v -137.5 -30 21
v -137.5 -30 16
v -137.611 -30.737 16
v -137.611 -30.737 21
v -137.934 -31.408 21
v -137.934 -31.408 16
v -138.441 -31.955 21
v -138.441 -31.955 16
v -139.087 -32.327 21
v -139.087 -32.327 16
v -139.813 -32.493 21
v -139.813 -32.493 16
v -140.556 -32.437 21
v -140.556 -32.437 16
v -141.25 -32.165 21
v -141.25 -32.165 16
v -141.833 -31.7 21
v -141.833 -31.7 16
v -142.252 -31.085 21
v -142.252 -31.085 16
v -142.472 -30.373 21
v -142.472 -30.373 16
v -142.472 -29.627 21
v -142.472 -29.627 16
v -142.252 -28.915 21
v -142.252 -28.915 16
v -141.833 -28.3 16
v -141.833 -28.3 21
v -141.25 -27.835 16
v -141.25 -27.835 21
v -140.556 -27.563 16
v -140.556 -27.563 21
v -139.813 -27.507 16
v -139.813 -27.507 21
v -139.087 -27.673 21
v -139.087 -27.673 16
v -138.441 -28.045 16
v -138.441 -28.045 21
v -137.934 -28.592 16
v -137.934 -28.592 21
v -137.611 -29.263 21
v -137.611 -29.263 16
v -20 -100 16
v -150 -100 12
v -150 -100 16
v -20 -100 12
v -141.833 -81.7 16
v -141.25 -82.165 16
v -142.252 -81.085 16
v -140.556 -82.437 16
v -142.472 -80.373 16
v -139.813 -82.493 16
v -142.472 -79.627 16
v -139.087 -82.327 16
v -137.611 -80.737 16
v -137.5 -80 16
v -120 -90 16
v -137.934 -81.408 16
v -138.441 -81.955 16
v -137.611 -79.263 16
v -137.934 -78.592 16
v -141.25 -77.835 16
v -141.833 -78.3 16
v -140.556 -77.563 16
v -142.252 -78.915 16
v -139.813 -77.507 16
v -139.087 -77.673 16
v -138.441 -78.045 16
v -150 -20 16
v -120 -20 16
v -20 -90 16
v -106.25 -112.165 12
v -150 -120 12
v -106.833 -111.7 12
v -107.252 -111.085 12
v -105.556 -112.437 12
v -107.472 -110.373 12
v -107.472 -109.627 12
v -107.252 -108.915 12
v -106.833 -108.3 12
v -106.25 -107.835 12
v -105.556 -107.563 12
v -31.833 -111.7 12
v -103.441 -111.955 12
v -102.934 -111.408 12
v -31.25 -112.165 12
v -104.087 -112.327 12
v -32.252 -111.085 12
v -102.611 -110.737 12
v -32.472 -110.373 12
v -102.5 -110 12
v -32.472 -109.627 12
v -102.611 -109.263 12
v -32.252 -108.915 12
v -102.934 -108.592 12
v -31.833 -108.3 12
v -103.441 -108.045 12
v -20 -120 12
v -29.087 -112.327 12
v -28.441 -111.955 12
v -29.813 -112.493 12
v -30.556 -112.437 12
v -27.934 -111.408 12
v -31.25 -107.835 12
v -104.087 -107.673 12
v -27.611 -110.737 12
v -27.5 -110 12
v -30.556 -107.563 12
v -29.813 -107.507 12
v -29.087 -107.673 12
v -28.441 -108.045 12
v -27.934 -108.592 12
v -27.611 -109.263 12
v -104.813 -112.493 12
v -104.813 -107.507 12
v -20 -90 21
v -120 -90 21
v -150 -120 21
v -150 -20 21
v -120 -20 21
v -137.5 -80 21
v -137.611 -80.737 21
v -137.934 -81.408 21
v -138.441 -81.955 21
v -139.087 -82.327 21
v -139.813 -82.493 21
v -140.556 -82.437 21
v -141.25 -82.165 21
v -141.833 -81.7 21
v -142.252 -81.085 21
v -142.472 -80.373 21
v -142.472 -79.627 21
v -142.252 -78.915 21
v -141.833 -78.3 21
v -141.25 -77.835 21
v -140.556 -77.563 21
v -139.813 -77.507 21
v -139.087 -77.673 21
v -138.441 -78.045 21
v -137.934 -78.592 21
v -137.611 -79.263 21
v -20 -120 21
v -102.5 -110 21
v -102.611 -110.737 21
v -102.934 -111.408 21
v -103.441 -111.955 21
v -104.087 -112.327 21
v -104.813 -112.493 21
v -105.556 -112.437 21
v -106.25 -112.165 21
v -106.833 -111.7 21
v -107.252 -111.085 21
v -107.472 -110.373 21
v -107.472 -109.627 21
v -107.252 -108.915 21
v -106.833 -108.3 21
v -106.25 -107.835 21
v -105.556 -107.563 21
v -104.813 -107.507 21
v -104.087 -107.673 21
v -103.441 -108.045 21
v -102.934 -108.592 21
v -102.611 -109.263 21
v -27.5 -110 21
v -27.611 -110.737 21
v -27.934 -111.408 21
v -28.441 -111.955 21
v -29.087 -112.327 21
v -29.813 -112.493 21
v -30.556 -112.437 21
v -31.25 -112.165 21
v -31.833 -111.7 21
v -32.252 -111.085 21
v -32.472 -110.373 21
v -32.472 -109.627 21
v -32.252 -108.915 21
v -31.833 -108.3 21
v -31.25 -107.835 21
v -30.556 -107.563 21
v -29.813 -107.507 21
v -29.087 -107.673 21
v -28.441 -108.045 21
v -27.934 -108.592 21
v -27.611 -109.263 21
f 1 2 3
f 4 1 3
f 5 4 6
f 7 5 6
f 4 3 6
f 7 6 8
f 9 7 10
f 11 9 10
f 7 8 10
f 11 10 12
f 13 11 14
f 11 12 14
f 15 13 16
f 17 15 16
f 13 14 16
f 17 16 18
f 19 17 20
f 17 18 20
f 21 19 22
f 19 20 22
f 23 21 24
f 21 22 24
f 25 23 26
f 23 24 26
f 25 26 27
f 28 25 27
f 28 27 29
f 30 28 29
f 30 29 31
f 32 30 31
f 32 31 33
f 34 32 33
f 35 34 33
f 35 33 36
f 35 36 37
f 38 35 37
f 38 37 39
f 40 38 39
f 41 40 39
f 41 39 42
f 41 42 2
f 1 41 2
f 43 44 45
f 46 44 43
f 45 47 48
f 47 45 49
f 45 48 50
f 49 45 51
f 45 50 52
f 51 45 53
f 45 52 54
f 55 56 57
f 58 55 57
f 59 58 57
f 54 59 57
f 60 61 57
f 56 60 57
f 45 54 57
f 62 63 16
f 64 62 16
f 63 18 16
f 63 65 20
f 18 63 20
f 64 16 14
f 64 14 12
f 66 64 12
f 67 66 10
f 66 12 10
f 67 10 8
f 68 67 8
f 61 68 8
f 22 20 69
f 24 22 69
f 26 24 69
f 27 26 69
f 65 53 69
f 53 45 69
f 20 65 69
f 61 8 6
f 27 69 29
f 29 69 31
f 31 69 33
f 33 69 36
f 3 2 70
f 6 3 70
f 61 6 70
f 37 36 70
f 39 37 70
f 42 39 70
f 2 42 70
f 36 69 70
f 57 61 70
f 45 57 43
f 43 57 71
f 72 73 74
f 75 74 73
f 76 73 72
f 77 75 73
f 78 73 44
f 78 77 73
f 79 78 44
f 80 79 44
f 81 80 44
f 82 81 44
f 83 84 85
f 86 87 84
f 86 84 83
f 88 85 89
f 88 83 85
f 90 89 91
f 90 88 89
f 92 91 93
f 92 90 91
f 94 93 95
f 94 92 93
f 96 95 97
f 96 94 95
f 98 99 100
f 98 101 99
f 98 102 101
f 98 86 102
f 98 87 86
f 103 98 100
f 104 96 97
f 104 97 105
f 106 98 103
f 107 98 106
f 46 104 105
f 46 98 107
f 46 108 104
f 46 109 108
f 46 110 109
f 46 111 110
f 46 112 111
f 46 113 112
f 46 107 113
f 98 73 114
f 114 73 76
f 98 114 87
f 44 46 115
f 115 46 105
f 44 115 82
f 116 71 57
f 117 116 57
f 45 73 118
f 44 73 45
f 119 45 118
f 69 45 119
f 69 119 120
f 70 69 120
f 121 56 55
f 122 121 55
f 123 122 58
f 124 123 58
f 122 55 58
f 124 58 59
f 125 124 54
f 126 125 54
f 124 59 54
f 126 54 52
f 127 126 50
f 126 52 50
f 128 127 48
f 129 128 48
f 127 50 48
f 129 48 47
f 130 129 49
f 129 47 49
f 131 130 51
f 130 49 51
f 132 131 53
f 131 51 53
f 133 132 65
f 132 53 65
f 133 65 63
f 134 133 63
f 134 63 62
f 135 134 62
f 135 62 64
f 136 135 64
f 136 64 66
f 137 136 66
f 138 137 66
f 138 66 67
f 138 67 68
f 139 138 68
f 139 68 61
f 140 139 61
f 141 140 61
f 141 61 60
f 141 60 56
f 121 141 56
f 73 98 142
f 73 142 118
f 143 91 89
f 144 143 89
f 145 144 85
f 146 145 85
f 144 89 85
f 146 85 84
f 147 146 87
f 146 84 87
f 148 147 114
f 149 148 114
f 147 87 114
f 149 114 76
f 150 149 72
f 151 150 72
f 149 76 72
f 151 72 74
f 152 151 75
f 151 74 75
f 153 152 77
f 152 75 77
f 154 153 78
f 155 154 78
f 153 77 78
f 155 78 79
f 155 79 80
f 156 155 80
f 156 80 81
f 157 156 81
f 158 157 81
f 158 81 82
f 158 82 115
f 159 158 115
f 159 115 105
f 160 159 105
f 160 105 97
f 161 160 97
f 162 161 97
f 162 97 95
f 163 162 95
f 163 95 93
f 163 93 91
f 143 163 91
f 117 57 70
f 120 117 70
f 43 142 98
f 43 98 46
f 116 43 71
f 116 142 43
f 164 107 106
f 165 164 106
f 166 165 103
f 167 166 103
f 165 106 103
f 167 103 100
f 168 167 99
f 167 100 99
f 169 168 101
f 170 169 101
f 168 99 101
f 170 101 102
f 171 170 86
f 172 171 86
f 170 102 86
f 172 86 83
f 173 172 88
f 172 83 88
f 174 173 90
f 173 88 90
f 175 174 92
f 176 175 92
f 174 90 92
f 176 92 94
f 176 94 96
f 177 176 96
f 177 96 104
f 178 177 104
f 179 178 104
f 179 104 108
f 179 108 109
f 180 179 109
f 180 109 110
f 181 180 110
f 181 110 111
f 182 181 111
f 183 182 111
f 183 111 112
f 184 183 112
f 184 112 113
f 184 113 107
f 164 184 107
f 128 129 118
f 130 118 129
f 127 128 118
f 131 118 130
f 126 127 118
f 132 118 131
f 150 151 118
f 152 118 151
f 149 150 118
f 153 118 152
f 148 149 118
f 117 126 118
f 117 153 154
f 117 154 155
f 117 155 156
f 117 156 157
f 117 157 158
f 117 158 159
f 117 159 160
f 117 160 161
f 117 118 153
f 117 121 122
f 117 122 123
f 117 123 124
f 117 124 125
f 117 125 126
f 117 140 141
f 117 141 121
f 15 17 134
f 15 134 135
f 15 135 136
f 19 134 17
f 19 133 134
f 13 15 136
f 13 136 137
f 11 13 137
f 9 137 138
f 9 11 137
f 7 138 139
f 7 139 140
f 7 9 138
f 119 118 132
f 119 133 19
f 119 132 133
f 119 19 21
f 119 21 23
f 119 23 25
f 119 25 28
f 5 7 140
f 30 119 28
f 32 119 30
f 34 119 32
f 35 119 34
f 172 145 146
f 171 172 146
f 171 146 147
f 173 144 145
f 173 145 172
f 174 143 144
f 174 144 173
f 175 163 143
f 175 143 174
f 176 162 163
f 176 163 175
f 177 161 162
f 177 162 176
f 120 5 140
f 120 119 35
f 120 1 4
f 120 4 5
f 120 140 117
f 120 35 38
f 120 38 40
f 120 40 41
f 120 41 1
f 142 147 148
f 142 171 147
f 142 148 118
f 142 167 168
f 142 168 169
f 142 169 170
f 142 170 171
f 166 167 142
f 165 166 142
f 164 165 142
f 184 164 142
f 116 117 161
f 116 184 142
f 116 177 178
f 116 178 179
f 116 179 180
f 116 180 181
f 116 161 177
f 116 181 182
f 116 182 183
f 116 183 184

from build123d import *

# Parameters (mm, degrees)
F1_DEPTH  = 12
F2_W      = 130
F2_H      = 20
F3_DEPTH  = 5
F4_W      = 105
F4_H      = 20
F5_DEPTH  = 5
F7_W      = 20
F7_H      = 100
F7_R      = 2.5
F7_H_2    = 20
F7_W_2    = 130
F8_DEPTH  = 25
F9_DEPTH  = 5
F10_W     = 130
F10_H     = 20
F10_W_2   = 20
F10_H_2   = 100
F11_DEPTH = 25
F12_W     = 100
F12_H     = 16
F13_DEPTH = 150
F14_W     = 80
F14_H     = 4
F15_DEPTH = 30.001


with BuildPart() as f1:
    # F0 (on Top) → F1 (new body)
    with BuildSketch(Plane.XY):
        with BuildLine():
            add(Edge.make_bspline(
                [(-116.5, 0), (-116.5, -86.5), (0, -86.5)],
                knots=[3.1415926536, 3.1415926536, 3.1415926536, 4.7123889804, 4.7123889804, 4.7123889804], degree=2, weights=[1, 0.7071067812, 1]))
            Line((-116.5, 0), (-116.5, -86.5))
            Line((-116.5, -86.5), (0, -86.5))
        make_face()
        Polygon((-116.5, -86.5), (-116.5, 0), (-130, 0), (-130, -100), (0, -100), (0, -86.5), align=None)
    extrude(amount=F1_DEPTH)

    # F2 (on face) → F3 (join)
    with BuildSketch(Plane.XZ.offset(100)):
        with Locations((-65, 6)):
            Rectangle(F2_W, F2_H)
    extrude(amount=F3_DEPTH)

    # F4 (on face) → F5 (join)
    with BuildSketch(Plane(origin=(-130, 0, 0), x_dir=(0, -1, 0), z_dir=(-1, 0, 0))):
        with Locations((52.5, 6)):
            Rectangle(F4_W, F4_H)
    extrude(amount=F5_DEPTH)

    # F7 (on face) → F8 (join)
    with BuildSketch(Plane(origin=(0, 0, -4), x_dir=(1, 0, 0), z_dir=(0, 0, -1))):
        with Locations((-140, 50)):
            Rectangle(F7_W, F7_H)
        with Locations((-140, 30)):
            Circle(F7_R, mode=Mode.SUBTRACT)
        with Locations((-140, 80)):
            Circle(F7_R, mode=Mode.SUBTRACT)
        with Locations((-140, 110)):
            Rectangle(F7_W, F7_H_2)
        with Locations((-65, 110)):
            Rectangle(F7_W_2, F7_H_2)
        with Locations((-105, 110)):
            Circle(F7_R, mode=Mode.SUBTRACT)
        with Locations((-30, 110)):
            Circle(F7_R, mode=Mode.SUBTRACT)
    extrude(amount=-F8_DEPTH)

    # F6 (on face) → F9 (join)
    with BuildSketch(Plane.XY.offset(16)):
        Polygon((-120, 0), (-135, 0), (-135, -105), (0, -105), (0, -90), (-120, -90), align=None)
    extrude(amount=F9_DEPTH)

    # F10 (on Top) → F11 (cut, symmetric)
    with BuildSketch(Plane.XY):
        with Locations((-85, -10)):
            Rectangle(F10_W, F10_H)
        with Locations((-10, -10)):
            Rectangle(F10_W_2, F10_H)
        with Locations((-10, -70)):
            Rectangle(F10_W_2, F10_H_2)
    extrude(amount=F11_DEPTH, both=True, mode=Mode.SUBTRACT)

    # F12 (on face) → F13 (cut)
    with BuildSketch(Plane.YZ.offset(-20)):
        with Locations((-70, 4)):
            Rectangle(F12_W, F12_H)
    extrude(amount=-F13_DEPTH, mode=Mode.SUBTRACT)

    # F14 (on face) → F15 (cut, through all)
    with BuildSketch(Plane.YZ.offset(-120)):
        with Locations((-60, 14)):
            Rectangle(F14_W, F14_H)
    extrude(amount=-F15_DEPTH, mode=Mode.SUBTRACT)


solid = f1.part
